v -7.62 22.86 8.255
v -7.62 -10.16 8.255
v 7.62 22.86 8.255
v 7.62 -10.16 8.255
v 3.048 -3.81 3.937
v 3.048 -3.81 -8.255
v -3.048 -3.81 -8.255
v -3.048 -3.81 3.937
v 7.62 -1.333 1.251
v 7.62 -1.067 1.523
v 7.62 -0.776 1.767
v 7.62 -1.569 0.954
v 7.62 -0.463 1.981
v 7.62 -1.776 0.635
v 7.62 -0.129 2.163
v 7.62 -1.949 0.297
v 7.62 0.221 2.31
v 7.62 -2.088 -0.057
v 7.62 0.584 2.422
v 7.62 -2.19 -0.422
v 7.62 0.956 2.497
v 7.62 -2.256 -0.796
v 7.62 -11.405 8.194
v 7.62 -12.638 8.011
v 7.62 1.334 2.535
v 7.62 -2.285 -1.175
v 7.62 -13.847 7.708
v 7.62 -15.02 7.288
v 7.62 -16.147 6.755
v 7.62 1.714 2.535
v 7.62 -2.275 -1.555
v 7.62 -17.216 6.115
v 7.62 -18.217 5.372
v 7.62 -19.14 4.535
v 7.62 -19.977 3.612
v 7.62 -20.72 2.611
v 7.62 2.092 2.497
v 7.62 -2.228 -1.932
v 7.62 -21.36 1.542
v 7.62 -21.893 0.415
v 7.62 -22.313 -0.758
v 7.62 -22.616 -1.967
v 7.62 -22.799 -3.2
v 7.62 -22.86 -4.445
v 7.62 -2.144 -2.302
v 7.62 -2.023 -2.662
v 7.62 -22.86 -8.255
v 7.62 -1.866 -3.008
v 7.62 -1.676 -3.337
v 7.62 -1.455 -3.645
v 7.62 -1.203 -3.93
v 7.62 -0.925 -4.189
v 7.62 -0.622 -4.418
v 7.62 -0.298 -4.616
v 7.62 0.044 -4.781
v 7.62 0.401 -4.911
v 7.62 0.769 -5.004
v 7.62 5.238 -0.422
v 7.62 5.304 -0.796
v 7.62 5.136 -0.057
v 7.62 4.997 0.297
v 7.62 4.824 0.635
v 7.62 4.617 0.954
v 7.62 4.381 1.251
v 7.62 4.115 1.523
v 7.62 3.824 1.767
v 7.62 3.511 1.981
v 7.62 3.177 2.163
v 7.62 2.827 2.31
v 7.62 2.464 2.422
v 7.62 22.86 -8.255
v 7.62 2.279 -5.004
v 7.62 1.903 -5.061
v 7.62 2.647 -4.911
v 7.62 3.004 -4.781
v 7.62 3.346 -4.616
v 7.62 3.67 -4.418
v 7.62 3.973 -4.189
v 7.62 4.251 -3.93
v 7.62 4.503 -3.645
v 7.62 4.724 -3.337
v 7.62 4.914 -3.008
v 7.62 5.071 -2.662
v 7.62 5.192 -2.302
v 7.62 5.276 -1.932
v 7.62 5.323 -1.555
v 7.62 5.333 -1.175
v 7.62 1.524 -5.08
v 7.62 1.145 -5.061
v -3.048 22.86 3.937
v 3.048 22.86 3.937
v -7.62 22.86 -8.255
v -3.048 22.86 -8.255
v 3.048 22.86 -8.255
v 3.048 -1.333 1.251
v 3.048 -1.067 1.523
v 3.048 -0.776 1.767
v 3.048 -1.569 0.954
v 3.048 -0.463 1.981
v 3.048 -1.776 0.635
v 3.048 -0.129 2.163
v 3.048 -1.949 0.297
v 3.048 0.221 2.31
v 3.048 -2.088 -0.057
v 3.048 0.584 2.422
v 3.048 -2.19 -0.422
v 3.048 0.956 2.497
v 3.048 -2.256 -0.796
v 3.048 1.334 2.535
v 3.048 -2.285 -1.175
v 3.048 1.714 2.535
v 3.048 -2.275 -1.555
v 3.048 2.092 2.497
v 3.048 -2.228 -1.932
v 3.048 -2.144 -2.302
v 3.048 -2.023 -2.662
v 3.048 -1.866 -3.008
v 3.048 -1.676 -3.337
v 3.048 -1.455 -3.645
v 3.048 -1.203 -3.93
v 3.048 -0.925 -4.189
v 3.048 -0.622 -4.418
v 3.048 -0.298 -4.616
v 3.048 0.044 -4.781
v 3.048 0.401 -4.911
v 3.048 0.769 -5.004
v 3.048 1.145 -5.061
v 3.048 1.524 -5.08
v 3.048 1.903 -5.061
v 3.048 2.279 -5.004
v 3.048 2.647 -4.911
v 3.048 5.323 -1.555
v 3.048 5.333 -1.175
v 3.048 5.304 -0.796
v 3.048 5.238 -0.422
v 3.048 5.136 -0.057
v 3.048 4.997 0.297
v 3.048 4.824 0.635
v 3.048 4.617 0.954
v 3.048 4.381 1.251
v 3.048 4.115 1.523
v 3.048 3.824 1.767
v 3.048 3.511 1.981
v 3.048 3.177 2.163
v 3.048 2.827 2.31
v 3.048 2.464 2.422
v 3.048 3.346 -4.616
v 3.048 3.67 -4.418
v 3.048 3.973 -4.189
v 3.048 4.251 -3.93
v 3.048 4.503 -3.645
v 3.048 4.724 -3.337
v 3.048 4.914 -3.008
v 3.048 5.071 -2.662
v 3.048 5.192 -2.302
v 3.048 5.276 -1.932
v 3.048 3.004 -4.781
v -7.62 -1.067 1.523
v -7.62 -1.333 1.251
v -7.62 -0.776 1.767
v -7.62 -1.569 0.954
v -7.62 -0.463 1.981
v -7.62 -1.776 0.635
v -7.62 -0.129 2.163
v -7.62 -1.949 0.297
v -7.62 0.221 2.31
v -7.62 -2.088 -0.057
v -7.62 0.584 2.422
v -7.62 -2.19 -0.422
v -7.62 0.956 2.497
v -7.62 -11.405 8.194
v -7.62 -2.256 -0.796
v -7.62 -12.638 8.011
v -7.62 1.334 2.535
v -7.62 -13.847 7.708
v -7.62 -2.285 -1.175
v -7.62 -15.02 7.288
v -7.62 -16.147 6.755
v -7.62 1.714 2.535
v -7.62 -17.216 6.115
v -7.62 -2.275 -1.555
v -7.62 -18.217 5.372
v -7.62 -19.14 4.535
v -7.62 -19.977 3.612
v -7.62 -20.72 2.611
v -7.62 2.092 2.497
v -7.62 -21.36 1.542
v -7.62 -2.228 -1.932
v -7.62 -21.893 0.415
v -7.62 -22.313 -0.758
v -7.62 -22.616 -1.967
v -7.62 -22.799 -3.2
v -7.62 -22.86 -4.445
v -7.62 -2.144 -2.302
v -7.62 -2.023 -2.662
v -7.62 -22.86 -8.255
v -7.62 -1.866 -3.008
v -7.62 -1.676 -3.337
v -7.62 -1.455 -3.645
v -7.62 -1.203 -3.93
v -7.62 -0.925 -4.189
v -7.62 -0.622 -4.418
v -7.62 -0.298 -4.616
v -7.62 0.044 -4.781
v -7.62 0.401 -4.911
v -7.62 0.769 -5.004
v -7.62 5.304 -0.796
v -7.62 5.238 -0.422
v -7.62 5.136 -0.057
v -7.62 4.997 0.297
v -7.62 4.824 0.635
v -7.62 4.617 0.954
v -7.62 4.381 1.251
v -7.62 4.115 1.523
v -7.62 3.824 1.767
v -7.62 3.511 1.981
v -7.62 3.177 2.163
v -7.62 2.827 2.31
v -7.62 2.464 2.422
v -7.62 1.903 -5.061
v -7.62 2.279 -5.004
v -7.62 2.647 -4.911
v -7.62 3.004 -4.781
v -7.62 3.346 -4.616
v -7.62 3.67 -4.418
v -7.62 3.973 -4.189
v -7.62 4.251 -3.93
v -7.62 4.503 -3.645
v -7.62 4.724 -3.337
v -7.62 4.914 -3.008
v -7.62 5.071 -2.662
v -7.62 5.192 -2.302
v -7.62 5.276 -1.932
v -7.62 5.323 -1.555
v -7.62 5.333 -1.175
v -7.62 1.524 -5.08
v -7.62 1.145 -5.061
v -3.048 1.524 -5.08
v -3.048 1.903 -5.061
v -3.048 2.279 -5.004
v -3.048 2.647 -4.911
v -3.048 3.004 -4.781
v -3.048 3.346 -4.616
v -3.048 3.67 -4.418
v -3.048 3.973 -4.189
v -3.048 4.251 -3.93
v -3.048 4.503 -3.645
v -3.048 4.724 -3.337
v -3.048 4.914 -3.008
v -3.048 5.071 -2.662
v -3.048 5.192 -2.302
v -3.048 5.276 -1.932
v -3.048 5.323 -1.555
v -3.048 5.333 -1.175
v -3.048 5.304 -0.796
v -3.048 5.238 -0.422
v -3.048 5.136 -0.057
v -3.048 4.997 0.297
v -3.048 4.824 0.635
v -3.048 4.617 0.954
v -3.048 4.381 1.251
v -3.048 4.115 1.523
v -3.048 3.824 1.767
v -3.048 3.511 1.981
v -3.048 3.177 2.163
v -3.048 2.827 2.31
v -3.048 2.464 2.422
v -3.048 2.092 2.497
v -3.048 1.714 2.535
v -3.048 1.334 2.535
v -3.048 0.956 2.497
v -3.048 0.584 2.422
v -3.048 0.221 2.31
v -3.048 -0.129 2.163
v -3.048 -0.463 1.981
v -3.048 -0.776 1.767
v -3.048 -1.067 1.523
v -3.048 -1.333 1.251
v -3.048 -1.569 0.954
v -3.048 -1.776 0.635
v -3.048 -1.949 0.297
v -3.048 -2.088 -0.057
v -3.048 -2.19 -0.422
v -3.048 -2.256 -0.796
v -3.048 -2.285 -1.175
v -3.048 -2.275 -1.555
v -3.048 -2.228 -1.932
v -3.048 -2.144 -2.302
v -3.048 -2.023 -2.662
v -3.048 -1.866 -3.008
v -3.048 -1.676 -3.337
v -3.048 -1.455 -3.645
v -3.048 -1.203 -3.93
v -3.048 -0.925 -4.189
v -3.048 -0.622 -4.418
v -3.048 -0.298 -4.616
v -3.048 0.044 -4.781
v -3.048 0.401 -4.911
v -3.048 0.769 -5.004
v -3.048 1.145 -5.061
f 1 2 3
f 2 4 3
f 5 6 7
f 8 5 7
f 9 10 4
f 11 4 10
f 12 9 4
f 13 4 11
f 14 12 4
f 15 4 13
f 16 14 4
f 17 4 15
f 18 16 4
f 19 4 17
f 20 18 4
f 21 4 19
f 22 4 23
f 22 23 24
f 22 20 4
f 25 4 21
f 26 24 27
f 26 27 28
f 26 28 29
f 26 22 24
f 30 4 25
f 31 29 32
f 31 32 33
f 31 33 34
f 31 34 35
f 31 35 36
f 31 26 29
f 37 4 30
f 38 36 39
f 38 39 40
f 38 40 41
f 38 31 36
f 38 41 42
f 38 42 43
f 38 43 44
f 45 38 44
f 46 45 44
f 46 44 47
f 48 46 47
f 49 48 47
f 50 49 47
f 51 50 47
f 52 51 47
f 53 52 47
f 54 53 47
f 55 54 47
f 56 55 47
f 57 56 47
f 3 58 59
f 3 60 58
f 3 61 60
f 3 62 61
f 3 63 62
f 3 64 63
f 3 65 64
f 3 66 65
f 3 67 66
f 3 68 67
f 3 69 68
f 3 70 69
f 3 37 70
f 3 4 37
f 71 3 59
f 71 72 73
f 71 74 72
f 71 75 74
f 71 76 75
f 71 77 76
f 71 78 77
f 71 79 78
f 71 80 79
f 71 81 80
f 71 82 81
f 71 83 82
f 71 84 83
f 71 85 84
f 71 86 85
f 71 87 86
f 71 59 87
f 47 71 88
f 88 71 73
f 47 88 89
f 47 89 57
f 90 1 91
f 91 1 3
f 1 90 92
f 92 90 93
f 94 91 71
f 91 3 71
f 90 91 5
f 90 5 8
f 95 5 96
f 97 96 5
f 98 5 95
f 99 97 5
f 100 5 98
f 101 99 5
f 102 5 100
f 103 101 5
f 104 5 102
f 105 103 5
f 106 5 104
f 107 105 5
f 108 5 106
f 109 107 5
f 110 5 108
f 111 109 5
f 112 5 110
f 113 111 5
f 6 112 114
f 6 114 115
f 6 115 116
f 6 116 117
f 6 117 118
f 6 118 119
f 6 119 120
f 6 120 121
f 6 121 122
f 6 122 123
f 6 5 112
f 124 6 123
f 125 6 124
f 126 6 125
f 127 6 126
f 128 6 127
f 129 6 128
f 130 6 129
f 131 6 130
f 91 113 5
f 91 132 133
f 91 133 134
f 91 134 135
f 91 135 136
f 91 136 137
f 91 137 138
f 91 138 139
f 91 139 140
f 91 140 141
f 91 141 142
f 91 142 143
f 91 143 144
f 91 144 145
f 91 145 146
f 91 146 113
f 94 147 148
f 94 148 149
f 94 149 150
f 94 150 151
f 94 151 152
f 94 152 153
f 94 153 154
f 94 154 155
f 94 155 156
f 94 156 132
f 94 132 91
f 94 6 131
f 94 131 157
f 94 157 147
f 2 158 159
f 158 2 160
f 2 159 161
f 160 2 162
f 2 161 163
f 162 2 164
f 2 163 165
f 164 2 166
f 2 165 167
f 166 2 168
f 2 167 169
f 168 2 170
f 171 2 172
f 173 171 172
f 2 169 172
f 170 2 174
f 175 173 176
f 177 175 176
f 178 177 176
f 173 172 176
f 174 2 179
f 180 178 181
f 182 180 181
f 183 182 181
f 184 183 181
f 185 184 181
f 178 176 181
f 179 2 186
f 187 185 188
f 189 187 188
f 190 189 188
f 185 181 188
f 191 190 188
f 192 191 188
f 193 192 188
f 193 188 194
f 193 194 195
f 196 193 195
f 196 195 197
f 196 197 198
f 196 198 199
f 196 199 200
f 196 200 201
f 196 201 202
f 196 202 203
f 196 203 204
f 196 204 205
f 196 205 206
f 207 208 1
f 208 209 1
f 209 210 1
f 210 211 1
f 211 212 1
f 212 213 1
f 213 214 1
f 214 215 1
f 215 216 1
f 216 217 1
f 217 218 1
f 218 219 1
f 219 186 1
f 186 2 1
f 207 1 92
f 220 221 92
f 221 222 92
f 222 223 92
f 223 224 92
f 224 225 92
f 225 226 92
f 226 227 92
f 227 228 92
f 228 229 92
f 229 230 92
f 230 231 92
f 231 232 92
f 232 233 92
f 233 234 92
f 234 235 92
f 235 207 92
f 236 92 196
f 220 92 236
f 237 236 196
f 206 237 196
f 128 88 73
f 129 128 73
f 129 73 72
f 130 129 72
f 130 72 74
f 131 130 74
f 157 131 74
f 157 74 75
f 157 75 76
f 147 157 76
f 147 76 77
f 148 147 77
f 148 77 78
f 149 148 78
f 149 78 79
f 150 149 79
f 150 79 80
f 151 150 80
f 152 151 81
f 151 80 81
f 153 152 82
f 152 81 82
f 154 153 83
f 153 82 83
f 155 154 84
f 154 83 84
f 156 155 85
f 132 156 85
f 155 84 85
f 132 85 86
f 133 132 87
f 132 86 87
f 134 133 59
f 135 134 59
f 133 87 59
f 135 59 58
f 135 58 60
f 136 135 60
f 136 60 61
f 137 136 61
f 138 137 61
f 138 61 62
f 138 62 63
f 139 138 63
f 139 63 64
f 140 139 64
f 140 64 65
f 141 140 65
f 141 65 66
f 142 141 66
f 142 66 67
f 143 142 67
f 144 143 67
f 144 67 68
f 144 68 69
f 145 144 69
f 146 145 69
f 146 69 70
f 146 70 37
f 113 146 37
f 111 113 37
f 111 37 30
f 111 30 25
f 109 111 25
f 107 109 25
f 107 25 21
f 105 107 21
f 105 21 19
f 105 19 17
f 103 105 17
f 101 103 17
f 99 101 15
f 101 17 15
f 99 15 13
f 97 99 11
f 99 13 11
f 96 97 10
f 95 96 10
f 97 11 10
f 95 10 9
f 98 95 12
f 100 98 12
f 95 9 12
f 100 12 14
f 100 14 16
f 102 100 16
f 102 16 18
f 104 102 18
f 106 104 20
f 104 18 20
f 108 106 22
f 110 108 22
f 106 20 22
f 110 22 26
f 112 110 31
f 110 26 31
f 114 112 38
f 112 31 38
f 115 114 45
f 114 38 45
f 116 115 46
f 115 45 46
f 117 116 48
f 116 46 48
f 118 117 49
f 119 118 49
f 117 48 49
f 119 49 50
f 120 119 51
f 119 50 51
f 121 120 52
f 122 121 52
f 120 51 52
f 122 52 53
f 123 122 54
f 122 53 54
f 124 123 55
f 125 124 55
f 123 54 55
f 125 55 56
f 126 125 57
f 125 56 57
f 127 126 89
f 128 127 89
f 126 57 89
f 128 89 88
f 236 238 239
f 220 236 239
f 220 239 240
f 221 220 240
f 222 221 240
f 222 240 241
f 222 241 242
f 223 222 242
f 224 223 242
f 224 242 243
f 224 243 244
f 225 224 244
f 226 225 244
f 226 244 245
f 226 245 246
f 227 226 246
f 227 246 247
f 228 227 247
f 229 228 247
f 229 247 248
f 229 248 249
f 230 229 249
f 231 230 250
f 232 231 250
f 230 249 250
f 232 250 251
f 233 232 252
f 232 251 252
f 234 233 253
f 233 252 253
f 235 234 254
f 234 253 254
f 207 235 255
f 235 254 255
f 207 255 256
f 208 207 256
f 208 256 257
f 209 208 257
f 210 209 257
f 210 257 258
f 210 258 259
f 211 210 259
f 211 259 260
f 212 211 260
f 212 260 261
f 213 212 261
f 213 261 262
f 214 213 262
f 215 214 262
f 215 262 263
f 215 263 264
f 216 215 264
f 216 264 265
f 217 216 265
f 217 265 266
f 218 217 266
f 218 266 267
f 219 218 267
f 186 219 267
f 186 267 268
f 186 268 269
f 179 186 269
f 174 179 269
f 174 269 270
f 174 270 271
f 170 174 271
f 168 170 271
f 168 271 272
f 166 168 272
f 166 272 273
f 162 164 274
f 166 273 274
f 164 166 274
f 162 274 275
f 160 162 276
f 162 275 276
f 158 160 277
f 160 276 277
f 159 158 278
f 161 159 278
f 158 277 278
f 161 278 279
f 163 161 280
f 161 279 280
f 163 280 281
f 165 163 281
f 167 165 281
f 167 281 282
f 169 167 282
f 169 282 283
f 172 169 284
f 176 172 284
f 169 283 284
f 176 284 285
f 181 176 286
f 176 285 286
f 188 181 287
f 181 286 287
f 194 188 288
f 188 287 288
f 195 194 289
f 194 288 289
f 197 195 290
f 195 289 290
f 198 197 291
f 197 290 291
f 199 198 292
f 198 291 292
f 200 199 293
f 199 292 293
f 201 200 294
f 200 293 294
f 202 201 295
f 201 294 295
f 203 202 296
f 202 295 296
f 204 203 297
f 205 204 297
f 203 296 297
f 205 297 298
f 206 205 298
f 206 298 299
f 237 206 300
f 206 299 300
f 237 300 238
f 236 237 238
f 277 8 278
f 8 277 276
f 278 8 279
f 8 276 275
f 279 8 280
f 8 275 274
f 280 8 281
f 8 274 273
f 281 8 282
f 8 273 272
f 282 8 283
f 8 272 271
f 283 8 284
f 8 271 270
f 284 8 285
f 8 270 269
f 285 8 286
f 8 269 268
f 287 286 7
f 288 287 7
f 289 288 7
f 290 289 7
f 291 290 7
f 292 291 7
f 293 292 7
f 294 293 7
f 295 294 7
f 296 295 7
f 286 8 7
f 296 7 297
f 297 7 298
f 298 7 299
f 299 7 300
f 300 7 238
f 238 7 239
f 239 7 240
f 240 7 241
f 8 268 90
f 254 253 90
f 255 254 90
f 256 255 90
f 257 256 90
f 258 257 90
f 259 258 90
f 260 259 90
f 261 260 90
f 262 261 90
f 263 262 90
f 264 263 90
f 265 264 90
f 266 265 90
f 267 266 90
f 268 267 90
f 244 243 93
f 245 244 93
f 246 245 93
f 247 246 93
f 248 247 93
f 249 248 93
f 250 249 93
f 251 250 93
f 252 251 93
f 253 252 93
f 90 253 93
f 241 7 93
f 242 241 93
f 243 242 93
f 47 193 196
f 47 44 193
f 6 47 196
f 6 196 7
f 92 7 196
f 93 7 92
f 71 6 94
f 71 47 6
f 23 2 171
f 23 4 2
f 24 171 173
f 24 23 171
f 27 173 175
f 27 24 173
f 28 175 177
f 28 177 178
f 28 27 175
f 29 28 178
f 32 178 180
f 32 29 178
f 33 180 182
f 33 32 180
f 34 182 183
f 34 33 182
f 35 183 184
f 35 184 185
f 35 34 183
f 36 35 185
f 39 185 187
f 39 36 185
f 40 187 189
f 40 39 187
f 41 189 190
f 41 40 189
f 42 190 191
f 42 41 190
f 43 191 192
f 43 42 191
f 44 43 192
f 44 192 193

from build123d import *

# Parameters (mm, degrees)
SKETCH2_W           = 16.51
SKETCH2_H           = 45.72
BOSS_EXTRUDE1_DEPTH = 7.62
FILLET1_R           = 12.7
SKETCH3_W           = 6.096
SKETCH3_H           = 26.67
CUT_EXTRUDE1_DEPTH  = 12.192
SKETCH4_R           = 3.81
CUT_EXTRUDE2_DEPTH  = 29.687666775


with BuildPart() as part:
    # Sketch2 → Boss-Extrude1 (new, symmetric)
    with BuildSketch(Plane(origin=(0, 0, 0), x_dir=(0, 0, -1), z_dir=(1, 0, 0))):
        Rectangle(SKETCH2_W, SKETCH2_H)
    extrude(amount=BOSS_EXTRUDE1_DEPTH, both=True)

    # Fillet1
    fillet1_edges = [part.edges().sort_by_distance(p)[0] for p in [
        (0, -22.86, 8.255),
    ]]
    fillet(fillet1_edges, radius=FILLET1_R)

    # Sketch3 → Cut-Extrude1 (cut)
    with BuildSketch(Plane(origin=(0, 0, -8.255), x_dir=(-1, 0, 0), z_dir=(0, 0, -1))):
        with Locations((0, 9.525)):
            Rectangle(SKETCH3_W, SKETCH3_H)
    extrude(amount=-CUT_EXTRUDE1_DEPTH, mode=Mode.SUBTRACT)

    # Sketch4 → Cut-Extrude2 (cut, through all)
    with BuildSketch(Plane(origin=(7.62, 0, 0), x_dir=(0, 0, -1), z_dir=(1, 0, 0))):
        with Locations((1.27, 1.524)):
            Circle(SKETCH4_R)
    extrude(amount=-CUT_EXTRUDE2_DEPTH, mode=Mode.SUBTRACT)


solid = part.part
